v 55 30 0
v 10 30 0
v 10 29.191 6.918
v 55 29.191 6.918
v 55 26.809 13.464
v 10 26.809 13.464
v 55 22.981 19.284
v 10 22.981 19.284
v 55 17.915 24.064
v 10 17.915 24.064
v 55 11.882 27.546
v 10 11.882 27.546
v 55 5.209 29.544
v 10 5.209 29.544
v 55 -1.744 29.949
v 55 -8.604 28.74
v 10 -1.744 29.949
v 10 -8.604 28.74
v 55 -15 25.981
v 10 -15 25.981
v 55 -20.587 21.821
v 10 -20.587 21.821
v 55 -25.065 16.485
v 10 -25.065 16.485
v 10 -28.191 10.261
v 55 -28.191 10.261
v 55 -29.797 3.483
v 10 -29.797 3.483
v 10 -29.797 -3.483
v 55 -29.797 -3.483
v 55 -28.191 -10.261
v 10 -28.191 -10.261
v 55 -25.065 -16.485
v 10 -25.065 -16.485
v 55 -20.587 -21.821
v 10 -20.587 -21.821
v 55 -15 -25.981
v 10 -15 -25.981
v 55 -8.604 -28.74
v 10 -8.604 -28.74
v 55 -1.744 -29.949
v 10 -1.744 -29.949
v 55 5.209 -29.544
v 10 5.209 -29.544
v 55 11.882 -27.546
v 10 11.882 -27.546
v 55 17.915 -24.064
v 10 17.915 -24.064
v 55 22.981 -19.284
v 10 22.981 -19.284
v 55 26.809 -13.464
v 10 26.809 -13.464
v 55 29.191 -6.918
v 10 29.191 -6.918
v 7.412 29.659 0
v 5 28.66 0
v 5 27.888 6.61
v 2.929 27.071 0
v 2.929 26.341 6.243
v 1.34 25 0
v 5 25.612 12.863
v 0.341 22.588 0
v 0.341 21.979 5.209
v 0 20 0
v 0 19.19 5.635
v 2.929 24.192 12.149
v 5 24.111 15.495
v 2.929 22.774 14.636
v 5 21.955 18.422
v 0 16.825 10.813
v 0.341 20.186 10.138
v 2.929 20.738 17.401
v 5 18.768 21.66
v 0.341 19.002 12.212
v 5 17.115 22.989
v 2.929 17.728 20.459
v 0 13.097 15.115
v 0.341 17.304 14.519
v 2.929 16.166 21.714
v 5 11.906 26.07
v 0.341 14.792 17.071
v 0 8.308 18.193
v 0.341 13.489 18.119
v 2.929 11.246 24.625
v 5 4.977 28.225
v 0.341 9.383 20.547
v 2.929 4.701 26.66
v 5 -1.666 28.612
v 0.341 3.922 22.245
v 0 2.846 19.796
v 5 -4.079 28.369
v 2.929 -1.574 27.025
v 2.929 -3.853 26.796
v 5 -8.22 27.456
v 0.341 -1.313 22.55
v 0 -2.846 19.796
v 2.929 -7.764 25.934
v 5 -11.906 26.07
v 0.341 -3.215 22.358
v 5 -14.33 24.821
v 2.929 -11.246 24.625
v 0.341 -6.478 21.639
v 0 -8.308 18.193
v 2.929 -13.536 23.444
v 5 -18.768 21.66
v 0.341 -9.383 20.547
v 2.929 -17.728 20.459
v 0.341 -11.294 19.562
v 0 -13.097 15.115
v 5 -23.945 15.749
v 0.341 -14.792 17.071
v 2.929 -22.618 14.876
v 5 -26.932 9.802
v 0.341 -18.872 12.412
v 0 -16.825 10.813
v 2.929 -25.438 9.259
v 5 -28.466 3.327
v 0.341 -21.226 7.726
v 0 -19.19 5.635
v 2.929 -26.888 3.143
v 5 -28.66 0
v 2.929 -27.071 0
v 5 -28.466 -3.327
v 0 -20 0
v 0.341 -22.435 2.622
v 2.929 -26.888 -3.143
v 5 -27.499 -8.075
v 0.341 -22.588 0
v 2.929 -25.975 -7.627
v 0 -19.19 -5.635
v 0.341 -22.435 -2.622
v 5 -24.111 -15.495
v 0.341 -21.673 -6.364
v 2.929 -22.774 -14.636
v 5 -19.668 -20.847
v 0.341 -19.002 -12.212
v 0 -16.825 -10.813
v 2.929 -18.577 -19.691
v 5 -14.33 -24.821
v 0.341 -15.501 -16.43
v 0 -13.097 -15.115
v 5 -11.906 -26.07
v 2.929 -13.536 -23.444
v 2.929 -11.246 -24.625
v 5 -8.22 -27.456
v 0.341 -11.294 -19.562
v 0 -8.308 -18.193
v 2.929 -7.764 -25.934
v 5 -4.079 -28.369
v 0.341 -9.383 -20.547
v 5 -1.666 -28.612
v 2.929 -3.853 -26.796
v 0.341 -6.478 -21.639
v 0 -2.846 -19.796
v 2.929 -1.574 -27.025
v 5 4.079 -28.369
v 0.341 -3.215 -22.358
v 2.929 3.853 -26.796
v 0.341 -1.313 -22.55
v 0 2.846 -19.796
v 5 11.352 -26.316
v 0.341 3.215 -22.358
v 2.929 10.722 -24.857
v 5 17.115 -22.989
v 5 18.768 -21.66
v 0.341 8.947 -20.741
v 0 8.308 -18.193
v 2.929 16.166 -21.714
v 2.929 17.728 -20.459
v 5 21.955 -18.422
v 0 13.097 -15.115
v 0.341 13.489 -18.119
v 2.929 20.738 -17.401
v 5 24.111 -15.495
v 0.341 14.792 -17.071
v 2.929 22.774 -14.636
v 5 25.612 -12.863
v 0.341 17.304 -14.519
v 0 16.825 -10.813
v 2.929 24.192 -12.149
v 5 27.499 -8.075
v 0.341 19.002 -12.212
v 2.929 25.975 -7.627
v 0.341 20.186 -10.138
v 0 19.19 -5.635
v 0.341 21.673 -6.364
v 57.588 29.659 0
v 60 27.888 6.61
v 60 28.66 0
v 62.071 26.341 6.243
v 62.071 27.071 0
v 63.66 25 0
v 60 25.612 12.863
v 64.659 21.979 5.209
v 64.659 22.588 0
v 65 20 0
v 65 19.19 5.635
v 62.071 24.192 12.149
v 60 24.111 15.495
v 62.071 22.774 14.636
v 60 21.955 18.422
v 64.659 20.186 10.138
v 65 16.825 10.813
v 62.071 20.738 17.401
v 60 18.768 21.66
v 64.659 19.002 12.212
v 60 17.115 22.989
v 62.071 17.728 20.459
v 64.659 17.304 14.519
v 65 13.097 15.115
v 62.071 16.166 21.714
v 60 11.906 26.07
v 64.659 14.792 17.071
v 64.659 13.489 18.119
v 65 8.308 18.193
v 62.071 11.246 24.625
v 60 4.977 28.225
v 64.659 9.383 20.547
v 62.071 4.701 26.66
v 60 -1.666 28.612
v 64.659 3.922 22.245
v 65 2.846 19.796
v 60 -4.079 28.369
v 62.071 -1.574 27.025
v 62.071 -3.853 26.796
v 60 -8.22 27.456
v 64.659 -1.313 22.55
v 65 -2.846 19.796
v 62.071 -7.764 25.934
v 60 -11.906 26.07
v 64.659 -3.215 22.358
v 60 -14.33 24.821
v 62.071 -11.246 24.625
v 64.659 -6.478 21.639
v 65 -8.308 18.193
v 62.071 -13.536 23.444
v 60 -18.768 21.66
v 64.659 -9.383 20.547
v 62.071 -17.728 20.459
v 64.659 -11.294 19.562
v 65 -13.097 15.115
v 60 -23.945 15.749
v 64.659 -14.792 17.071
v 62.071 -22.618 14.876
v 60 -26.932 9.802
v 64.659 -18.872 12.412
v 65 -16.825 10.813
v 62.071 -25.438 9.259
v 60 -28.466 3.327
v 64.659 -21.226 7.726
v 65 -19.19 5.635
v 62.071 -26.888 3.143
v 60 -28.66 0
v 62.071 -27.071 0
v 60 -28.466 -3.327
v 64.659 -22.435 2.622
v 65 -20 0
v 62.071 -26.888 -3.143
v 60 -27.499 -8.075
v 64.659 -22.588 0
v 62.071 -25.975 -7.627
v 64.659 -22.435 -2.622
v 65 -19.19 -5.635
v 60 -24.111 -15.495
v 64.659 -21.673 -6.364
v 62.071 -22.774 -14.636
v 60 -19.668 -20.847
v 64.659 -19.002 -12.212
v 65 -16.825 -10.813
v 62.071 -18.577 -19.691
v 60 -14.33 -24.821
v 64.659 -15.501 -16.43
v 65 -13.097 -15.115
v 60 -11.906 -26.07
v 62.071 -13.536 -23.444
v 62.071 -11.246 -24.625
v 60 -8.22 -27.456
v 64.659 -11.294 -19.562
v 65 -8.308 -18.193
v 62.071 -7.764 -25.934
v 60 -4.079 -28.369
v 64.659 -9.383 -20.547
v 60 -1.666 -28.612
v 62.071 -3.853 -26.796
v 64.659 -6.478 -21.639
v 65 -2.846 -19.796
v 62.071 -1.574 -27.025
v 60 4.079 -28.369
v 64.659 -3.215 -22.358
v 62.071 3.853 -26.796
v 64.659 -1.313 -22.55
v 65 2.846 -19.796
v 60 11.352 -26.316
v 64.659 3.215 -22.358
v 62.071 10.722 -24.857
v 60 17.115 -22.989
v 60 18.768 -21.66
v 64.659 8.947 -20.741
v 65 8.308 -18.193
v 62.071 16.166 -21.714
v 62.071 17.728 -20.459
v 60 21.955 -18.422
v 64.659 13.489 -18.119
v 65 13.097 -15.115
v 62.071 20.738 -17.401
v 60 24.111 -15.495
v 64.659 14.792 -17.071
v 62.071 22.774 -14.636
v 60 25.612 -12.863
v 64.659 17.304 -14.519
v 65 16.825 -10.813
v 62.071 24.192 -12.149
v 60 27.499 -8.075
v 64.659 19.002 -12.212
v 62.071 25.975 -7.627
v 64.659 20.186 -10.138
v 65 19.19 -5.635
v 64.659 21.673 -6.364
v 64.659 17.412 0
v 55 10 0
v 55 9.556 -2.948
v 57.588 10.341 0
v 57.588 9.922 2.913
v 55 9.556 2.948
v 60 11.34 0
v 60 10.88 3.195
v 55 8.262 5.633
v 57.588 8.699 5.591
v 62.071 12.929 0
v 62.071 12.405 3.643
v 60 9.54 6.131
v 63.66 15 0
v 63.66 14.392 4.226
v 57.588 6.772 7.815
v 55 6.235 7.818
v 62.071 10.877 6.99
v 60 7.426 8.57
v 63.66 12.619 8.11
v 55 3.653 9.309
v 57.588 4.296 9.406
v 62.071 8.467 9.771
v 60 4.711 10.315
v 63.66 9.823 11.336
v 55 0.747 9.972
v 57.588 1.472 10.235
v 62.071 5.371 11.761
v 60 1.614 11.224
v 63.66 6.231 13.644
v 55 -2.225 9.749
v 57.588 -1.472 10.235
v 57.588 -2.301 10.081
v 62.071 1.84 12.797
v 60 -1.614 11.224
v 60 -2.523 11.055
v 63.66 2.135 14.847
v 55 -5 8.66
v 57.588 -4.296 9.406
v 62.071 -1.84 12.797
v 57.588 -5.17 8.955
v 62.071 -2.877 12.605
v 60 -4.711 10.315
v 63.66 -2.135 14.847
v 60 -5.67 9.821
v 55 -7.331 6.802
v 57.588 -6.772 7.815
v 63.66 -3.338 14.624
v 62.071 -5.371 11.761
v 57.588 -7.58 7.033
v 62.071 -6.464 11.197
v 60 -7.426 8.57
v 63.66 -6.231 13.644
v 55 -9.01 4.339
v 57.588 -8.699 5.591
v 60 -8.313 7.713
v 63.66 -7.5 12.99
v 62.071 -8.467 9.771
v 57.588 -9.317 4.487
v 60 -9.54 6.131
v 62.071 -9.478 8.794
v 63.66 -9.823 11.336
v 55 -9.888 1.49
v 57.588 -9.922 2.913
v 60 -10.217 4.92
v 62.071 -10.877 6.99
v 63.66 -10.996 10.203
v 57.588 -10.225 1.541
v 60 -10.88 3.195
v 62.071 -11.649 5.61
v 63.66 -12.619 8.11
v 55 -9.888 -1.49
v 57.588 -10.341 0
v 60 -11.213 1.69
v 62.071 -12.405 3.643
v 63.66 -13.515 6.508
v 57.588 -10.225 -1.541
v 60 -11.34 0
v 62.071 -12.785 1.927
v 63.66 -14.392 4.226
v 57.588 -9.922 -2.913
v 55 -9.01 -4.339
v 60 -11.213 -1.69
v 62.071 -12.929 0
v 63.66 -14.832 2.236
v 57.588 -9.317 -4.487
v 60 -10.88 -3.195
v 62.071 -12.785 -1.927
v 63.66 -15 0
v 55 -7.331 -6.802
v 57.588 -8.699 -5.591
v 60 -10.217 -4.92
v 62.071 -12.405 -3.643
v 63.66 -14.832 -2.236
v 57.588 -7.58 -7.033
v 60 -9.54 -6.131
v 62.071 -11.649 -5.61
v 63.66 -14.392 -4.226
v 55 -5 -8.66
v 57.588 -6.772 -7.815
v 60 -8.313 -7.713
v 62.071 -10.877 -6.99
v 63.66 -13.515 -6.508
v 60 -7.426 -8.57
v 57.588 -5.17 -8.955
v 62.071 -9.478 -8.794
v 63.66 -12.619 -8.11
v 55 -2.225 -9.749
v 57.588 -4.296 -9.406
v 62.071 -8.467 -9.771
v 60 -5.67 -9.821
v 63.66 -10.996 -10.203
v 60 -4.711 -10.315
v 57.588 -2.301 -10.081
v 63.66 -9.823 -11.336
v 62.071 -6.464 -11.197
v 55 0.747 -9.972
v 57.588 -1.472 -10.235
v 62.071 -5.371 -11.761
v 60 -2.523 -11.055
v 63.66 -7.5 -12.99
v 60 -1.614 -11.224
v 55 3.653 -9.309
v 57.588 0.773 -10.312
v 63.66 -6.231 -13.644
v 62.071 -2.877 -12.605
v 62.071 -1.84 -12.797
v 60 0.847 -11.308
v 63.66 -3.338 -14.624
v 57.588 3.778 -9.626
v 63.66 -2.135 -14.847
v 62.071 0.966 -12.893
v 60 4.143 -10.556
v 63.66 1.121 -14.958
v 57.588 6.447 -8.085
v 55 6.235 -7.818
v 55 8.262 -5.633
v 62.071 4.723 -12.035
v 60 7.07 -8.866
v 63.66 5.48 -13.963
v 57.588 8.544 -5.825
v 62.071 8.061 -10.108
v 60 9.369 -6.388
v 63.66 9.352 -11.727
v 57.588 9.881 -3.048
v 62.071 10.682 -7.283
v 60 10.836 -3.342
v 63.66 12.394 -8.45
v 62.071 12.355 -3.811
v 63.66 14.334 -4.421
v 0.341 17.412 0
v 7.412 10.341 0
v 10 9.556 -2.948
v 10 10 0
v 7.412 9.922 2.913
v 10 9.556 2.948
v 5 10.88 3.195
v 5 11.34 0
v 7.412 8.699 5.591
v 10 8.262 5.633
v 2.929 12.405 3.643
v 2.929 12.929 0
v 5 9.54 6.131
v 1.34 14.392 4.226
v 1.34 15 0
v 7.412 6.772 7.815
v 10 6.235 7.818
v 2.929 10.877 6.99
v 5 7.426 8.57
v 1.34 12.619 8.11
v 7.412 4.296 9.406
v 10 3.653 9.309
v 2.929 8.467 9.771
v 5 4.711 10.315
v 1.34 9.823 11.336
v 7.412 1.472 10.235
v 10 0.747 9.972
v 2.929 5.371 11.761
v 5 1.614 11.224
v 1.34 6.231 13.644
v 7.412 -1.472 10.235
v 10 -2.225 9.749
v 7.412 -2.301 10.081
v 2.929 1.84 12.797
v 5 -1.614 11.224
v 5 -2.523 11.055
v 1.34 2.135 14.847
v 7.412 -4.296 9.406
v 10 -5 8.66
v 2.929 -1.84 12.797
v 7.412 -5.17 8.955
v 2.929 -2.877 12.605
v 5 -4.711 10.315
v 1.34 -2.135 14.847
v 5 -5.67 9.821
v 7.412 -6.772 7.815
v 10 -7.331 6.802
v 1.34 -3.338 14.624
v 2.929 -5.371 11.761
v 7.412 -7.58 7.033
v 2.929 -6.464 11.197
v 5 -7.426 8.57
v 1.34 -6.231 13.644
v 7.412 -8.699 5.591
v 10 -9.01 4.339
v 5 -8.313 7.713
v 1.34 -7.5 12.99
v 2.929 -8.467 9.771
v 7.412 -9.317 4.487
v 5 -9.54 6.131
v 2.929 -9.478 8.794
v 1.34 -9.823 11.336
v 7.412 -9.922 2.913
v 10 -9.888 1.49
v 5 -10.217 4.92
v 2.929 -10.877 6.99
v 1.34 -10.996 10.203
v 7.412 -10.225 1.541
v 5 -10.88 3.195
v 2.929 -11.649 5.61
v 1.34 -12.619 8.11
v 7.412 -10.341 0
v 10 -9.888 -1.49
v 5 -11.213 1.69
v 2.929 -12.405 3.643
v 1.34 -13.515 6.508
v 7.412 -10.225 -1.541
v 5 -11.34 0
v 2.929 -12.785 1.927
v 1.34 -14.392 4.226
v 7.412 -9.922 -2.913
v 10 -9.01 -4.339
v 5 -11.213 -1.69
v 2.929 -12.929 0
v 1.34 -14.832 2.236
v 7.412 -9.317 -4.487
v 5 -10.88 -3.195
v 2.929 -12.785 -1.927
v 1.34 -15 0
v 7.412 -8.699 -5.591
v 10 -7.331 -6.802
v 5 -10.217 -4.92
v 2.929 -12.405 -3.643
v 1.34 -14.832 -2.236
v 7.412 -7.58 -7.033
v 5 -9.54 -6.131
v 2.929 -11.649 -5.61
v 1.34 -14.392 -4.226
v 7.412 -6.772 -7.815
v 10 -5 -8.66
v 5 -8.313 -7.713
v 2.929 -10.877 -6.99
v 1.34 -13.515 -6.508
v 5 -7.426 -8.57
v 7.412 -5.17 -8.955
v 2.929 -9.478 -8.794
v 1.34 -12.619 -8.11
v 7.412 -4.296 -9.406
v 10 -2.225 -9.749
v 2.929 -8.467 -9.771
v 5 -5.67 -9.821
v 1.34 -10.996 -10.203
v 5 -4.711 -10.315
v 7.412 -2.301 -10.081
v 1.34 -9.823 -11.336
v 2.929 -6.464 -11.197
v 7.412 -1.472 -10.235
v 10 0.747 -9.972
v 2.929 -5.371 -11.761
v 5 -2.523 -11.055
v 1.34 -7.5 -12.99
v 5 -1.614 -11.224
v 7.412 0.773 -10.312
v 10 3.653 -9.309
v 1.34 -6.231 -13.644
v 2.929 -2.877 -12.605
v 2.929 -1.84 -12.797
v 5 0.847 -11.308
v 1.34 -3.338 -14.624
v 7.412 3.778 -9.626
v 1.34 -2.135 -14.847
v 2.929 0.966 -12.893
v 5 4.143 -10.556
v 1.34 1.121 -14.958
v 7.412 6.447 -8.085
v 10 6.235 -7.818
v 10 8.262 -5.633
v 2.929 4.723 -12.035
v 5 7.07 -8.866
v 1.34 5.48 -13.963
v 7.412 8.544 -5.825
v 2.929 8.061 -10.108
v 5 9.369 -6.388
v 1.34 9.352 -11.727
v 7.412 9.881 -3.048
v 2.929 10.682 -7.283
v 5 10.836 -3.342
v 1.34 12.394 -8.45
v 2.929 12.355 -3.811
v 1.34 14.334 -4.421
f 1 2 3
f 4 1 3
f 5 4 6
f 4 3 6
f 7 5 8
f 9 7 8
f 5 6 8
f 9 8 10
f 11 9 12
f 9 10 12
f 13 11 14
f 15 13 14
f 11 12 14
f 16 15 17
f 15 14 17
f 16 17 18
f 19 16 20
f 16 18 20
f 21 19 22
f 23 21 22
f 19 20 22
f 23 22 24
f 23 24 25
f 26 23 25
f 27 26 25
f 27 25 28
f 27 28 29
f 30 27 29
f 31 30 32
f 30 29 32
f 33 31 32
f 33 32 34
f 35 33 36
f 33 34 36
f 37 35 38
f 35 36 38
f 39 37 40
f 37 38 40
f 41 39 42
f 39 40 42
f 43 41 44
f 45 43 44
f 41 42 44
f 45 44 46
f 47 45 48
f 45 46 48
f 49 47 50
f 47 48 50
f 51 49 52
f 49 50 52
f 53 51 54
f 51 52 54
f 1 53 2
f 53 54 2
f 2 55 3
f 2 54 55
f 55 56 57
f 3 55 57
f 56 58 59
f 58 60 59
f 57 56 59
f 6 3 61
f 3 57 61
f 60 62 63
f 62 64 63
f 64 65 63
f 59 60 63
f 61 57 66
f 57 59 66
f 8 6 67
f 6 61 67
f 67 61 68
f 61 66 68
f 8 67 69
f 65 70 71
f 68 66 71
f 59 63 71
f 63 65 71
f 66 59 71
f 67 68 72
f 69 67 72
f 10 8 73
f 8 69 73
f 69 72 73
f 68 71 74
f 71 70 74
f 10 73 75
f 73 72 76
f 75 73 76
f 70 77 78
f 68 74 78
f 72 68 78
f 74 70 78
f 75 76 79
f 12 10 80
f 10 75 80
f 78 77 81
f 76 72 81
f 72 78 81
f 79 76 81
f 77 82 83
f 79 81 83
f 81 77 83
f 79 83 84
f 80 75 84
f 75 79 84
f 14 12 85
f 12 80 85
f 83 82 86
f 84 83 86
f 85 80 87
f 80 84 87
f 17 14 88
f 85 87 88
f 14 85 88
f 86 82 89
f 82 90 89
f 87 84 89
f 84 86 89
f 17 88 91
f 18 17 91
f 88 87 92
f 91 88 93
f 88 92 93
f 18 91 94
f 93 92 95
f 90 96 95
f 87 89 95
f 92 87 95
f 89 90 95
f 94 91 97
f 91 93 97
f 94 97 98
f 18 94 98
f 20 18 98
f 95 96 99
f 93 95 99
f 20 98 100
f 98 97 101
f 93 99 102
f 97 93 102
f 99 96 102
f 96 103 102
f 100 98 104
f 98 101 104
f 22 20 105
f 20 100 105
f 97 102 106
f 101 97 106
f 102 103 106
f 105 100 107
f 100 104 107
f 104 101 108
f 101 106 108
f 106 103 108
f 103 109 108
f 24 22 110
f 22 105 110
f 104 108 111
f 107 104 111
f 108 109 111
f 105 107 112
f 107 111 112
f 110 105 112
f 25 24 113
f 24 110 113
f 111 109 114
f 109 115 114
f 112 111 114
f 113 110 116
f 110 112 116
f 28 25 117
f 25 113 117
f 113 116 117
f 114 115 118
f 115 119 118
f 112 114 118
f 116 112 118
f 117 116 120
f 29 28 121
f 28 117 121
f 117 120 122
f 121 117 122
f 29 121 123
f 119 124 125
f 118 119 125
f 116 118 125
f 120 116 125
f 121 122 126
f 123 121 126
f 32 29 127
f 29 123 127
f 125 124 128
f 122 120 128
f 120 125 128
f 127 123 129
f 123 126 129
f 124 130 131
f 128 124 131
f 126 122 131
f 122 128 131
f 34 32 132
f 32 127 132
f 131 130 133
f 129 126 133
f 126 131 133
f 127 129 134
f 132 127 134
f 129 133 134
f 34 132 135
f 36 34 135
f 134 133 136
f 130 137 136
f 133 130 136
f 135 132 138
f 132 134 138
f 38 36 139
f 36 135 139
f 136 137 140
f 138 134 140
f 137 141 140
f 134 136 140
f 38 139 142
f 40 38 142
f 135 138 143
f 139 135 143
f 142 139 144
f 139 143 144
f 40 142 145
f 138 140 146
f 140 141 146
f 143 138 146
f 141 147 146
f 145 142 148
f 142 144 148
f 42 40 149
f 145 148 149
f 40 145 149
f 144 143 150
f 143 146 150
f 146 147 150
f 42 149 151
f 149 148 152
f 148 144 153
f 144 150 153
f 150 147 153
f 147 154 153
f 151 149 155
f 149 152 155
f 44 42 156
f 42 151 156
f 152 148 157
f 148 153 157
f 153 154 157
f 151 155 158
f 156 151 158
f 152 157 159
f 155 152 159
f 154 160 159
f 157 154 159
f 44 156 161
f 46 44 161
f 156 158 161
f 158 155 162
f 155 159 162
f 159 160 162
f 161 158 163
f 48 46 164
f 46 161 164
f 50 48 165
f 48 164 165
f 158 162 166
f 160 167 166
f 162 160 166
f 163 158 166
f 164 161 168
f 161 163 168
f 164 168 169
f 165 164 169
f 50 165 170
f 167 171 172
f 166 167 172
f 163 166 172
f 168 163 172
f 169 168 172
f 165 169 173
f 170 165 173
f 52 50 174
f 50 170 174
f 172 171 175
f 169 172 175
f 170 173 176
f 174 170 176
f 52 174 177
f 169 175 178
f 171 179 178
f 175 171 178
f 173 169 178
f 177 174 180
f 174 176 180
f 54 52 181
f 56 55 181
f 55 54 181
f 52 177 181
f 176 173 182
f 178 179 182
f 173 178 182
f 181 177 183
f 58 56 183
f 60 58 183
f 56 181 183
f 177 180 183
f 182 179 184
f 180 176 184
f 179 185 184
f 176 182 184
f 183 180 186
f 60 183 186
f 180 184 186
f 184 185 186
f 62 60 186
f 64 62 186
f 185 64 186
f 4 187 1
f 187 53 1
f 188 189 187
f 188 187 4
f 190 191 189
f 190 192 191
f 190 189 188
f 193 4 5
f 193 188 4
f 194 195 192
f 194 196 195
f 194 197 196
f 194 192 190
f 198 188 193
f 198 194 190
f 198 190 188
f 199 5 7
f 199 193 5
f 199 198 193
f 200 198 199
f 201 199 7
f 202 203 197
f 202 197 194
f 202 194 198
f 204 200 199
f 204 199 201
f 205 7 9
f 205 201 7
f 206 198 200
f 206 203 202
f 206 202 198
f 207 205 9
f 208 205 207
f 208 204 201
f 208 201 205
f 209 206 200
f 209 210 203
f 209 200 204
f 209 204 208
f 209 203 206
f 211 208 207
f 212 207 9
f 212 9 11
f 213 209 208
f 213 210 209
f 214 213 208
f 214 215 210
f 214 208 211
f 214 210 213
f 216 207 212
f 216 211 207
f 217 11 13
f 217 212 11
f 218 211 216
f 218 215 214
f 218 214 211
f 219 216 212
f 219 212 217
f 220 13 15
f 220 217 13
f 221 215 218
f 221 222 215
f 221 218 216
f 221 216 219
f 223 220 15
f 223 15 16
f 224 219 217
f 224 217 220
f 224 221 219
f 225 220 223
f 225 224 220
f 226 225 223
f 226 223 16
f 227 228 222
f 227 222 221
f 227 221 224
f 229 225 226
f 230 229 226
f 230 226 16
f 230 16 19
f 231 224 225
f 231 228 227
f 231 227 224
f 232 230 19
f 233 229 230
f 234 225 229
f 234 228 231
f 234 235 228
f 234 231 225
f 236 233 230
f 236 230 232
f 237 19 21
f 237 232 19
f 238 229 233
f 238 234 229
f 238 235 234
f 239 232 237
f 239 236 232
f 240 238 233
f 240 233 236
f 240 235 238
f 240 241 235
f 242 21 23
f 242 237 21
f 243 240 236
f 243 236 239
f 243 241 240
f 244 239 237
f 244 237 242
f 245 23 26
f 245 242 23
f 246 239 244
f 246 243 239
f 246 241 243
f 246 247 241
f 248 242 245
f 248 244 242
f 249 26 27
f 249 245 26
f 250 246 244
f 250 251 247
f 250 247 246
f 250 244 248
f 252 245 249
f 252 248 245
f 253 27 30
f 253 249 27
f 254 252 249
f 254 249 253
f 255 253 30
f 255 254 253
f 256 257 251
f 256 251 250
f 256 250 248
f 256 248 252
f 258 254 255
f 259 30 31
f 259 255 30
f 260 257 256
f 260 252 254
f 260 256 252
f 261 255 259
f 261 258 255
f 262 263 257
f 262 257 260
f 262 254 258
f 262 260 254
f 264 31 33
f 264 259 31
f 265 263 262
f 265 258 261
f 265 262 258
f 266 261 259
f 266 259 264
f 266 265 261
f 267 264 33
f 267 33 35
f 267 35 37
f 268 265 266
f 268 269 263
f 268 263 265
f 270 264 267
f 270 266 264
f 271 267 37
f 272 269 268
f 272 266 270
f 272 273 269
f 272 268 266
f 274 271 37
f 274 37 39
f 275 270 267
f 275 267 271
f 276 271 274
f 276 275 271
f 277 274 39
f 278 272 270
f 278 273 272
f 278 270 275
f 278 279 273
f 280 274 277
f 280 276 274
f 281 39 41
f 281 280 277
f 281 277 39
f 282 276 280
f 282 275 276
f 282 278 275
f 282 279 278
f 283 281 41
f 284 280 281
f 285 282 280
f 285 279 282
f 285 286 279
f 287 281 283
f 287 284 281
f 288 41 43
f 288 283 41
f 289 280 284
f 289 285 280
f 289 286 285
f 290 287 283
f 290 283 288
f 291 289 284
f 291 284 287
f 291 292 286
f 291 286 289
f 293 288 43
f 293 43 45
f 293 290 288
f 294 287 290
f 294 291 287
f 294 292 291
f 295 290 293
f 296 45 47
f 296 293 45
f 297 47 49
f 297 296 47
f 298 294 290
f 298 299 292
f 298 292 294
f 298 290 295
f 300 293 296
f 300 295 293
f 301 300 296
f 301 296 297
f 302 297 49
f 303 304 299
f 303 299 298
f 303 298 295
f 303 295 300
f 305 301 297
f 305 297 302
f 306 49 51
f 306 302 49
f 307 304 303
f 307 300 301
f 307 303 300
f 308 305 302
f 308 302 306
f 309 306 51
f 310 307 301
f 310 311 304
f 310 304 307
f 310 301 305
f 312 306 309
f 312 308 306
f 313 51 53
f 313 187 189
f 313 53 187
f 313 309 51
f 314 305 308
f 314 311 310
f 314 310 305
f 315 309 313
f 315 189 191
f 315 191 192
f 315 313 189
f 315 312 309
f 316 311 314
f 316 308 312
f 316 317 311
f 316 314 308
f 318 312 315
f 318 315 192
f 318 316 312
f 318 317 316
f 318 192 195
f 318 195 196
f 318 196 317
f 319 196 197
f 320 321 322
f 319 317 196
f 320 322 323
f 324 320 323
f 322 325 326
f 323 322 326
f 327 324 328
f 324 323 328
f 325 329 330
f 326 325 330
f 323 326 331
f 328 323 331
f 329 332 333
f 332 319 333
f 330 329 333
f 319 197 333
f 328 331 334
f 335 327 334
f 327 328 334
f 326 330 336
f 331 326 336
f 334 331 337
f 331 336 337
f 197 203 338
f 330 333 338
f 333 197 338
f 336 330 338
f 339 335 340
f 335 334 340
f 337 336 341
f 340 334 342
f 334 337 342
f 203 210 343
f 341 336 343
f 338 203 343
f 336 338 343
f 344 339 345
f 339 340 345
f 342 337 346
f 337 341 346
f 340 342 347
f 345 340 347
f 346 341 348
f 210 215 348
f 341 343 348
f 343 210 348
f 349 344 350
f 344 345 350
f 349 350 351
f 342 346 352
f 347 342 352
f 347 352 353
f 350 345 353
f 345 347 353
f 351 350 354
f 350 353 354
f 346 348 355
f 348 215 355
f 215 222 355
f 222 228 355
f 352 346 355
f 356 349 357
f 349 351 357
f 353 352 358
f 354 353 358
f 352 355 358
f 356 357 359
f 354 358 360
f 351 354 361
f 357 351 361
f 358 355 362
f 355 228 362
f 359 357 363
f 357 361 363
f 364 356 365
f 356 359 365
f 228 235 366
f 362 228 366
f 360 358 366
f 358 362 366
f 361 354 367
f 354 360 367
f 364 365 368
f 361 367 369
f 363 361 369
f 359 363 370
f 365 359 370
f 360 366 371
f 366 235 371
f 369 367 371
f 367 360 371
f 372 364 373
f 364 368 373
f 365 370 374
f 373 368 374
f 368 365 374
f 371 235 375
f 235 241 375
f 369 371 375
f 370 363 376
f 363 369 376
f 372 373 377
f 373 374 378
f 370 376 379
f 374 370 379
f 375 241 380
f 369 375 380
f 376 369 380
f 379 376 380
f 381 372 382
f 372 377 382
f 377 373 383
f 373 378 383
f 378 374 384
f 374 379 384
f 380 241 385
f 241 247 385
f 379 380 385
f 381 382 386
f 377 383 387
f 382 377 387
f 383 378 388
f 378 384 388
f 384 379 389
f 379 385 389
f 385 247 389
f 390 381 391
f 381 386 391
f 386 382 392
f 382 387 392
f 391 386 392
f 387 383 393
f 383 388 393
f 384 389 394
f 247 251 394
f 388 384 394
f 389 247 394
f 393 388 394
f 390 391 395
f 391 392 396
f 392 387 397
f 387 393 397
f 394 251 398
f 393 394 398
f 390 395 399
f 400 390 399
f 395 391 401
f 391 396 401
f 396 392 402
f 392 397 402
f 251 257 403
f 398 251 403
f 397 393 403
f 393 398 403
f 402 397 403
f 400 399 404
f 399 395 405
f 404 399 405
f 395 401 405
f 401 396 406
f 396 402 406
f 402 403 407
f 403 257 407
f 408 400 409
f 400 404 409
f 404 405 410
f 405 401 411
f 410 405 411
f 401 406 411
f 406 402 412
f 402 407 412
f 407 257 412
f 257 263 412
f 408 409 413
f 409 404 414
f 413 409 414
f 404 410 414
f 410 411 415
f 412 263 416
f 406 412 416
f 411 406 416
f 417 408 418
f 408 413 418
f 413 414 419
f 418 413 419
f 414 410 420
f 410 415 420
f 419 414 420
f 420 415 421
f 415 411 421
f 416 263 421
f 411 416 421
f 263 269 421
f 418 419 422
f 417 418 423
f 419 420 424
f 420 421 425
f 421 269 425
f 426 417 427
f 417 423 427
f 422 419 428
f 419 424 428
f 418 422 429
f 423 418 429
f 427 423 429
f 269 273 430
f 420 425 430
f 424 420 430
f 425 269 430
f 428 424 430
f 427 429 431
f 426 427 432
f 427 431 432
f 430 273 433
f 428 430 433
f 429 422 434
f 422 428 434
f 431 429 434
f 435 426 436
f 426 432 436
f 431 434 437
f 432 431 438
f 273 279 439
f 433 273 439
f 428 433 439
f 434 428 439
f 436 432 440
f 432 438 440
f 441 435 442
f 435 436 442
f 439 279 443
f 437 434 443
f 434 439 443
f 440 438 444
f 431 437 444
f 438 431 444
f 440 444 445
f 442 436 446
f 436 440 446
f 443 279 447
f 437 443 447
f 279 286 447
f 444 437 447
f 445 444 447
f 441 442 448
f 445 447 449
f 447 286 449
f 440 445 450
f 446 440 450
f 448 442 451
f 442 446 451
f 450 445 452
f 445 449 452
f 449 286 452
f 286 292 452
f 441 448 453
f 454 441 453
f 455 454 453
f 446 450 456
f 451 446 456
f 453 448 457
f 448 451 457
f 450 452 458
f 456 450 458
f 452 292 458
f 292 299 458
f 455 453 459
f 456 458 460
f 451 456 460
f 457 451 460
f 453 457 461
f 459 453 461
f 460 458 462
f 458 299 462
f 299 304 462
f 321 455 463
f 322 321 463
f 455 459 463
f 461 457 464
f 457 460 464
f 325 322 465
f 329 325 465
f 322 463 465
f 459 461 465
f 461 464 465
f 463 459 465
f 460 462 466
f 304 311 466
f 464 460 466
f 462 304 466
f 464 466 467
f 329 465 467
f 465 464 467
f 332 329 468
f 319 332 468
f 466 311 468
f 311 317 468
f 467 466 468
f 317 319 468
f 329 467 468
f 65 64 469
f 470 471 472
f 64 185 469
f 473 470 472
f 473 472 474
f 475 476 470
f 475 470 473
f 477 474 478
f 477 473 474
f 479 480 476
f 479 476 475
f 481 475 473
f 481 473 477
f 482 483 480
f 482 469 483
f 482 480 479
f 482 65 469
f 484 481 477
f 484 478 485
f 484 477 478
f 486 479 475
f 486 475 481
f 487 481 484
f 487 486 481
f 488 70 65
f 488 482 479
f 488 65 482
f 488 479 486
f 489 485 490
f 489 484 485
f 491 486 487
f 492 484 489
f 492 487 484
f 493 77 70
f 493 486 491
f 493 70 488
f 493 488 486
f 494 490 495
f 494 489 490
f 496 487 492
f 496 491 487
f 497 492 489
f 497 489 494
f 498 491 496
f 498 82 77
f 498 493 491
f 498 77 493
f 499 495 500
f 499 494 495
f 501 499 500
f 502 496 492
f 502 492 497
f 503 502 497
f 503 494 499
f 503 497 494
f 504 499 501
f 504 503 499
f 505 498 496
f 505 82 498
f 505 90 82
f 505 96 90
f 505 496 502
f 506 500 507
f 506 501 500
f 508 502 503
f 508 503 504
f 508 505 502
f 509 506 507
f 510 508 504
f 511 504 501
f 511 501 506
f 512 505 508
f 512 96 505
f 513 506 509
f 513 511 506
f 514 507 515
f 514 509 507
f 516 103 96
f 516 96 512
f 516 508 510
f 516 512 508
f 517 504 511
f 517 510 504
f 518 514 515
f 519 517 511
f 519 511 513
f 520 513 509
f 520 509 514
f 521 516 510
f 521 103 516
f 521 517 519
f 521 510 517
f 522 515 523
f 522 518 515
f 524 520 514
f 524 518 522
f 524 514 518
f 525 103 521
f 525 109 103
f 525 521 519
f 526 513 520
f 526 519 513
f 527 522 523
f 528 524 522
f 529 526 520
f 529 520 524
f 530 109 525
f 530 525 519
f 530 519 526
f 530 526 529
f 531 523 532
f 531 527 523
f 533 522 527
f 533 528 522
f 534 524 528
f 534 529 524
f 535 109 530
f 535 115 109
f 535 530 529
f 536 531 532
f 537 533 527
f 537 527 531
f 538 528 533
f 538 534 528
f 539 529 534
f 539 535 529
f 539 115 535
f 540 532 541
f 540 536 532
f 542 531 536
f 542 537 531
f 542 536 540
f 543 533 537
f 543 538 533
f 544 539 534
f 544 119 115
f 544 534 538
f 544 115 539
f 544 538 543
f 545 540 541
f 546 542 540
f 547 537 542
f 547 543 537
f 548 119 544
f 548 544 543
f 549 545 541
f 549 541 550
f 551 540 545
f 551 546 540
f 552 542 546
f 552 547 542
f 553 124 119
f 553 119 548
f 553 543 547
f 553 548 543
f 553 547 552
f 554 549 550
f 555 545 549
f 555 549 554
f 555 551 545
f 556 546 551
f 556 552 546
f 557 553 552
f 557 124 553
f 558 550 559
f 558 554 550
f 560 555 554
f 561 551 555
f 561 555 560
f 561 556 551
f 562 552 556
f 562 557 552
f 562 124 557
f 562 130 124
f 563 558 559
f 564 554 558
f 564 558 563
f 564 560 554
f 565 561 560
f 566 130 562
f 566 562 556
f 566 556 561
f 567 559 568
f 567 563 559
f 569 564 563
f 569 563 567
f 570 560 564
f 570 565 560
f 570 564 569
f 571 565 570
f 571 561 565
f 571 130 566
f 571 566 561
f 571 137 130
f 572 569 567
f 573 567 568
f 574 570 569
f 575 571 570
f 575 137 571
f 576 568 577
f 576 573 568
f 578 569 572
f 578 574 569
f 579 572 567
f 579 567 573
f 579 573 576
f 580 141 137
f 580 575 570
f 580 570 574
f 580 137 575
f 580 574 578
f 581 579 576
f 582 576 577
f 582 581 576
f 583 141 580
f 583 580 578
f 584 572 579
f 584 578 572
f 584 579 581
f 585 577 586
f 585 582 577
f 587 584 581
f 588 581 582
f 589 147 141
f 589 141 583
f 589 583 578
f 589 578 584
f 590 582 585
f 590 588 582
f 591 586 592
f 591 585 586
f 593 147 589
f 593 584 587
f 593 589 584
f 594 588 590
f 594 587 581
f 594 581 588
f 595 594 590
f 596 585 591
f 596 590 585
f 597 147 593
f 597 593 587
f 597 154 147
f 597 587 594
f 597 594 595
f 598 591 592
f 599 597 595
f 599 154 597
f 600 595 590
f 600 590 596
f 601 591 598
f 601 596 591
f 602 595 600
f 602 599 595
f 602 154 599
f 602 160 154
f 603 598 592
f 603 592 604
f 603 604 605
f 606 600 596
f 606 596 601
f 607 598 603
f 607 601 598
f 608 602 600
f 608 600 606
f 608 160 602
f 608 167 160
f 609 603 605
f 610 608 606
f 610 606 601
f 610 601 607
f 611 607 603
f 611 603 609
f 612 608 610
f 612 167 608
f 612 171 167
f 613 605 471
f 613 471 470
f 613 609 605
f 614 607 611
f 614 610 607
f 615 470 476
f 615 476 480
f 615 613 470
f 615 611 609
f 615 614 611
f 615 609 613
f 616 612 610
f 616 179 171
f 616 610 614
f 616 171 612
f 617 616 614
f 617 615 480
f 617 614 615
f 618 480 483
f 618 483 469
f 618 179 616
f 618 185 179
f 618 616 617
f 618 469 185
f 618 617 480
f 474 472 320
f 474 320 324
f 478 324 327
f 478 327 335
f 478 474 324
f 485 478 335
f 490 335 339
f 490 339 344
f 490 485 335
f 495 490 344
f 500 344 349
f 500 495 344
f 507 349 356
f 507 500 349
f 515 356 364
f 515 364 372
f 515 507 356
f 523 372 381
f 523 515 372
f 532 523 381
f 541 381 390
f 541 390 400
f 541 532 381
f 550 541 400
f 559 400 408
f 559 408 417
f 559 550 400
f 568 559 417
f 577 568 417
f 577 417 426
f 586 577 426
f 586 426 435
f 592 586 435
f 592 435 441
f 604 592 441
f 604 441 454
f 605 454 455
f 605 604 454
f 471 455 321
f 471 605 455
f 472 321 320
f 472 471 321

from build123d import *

# Parameters (mm, degrees)
F0_R     = 30
F0_R_2   = 10
F1_DEPTH = 65
F2_R     = 9.99999


# Not quite as in the source:
# - a fillet or chamfer is up to 0.001 mm smaller than in the source, because OpenCascade refuses the exact size


with BuildPart() as f1:
    # F0 (on Right) → F1 (new body)
    with BuildSketch(Plane.YZ):
        Circle(F0_R)
        Circle(F0_R_2, mode=Mode.SUBTRACT)
    extrude(amount=F1_DEPTH)

    # F2 (radius 10 in the source; OpenCascade refuses exactly that, so slightly less here)
    f2_edges = [f1.edges().sort_by_distance(p)[0] for p in [
        (65, -30, 0),
        (65, -10, 0),
        (32.5, 30, 0),
        (0, -30, 0),
        (0, -10, 0),
        (32.5, 10, 0),
    ]]
    fillet(f2_edges, radius=F2_R)


solid = f1.part
